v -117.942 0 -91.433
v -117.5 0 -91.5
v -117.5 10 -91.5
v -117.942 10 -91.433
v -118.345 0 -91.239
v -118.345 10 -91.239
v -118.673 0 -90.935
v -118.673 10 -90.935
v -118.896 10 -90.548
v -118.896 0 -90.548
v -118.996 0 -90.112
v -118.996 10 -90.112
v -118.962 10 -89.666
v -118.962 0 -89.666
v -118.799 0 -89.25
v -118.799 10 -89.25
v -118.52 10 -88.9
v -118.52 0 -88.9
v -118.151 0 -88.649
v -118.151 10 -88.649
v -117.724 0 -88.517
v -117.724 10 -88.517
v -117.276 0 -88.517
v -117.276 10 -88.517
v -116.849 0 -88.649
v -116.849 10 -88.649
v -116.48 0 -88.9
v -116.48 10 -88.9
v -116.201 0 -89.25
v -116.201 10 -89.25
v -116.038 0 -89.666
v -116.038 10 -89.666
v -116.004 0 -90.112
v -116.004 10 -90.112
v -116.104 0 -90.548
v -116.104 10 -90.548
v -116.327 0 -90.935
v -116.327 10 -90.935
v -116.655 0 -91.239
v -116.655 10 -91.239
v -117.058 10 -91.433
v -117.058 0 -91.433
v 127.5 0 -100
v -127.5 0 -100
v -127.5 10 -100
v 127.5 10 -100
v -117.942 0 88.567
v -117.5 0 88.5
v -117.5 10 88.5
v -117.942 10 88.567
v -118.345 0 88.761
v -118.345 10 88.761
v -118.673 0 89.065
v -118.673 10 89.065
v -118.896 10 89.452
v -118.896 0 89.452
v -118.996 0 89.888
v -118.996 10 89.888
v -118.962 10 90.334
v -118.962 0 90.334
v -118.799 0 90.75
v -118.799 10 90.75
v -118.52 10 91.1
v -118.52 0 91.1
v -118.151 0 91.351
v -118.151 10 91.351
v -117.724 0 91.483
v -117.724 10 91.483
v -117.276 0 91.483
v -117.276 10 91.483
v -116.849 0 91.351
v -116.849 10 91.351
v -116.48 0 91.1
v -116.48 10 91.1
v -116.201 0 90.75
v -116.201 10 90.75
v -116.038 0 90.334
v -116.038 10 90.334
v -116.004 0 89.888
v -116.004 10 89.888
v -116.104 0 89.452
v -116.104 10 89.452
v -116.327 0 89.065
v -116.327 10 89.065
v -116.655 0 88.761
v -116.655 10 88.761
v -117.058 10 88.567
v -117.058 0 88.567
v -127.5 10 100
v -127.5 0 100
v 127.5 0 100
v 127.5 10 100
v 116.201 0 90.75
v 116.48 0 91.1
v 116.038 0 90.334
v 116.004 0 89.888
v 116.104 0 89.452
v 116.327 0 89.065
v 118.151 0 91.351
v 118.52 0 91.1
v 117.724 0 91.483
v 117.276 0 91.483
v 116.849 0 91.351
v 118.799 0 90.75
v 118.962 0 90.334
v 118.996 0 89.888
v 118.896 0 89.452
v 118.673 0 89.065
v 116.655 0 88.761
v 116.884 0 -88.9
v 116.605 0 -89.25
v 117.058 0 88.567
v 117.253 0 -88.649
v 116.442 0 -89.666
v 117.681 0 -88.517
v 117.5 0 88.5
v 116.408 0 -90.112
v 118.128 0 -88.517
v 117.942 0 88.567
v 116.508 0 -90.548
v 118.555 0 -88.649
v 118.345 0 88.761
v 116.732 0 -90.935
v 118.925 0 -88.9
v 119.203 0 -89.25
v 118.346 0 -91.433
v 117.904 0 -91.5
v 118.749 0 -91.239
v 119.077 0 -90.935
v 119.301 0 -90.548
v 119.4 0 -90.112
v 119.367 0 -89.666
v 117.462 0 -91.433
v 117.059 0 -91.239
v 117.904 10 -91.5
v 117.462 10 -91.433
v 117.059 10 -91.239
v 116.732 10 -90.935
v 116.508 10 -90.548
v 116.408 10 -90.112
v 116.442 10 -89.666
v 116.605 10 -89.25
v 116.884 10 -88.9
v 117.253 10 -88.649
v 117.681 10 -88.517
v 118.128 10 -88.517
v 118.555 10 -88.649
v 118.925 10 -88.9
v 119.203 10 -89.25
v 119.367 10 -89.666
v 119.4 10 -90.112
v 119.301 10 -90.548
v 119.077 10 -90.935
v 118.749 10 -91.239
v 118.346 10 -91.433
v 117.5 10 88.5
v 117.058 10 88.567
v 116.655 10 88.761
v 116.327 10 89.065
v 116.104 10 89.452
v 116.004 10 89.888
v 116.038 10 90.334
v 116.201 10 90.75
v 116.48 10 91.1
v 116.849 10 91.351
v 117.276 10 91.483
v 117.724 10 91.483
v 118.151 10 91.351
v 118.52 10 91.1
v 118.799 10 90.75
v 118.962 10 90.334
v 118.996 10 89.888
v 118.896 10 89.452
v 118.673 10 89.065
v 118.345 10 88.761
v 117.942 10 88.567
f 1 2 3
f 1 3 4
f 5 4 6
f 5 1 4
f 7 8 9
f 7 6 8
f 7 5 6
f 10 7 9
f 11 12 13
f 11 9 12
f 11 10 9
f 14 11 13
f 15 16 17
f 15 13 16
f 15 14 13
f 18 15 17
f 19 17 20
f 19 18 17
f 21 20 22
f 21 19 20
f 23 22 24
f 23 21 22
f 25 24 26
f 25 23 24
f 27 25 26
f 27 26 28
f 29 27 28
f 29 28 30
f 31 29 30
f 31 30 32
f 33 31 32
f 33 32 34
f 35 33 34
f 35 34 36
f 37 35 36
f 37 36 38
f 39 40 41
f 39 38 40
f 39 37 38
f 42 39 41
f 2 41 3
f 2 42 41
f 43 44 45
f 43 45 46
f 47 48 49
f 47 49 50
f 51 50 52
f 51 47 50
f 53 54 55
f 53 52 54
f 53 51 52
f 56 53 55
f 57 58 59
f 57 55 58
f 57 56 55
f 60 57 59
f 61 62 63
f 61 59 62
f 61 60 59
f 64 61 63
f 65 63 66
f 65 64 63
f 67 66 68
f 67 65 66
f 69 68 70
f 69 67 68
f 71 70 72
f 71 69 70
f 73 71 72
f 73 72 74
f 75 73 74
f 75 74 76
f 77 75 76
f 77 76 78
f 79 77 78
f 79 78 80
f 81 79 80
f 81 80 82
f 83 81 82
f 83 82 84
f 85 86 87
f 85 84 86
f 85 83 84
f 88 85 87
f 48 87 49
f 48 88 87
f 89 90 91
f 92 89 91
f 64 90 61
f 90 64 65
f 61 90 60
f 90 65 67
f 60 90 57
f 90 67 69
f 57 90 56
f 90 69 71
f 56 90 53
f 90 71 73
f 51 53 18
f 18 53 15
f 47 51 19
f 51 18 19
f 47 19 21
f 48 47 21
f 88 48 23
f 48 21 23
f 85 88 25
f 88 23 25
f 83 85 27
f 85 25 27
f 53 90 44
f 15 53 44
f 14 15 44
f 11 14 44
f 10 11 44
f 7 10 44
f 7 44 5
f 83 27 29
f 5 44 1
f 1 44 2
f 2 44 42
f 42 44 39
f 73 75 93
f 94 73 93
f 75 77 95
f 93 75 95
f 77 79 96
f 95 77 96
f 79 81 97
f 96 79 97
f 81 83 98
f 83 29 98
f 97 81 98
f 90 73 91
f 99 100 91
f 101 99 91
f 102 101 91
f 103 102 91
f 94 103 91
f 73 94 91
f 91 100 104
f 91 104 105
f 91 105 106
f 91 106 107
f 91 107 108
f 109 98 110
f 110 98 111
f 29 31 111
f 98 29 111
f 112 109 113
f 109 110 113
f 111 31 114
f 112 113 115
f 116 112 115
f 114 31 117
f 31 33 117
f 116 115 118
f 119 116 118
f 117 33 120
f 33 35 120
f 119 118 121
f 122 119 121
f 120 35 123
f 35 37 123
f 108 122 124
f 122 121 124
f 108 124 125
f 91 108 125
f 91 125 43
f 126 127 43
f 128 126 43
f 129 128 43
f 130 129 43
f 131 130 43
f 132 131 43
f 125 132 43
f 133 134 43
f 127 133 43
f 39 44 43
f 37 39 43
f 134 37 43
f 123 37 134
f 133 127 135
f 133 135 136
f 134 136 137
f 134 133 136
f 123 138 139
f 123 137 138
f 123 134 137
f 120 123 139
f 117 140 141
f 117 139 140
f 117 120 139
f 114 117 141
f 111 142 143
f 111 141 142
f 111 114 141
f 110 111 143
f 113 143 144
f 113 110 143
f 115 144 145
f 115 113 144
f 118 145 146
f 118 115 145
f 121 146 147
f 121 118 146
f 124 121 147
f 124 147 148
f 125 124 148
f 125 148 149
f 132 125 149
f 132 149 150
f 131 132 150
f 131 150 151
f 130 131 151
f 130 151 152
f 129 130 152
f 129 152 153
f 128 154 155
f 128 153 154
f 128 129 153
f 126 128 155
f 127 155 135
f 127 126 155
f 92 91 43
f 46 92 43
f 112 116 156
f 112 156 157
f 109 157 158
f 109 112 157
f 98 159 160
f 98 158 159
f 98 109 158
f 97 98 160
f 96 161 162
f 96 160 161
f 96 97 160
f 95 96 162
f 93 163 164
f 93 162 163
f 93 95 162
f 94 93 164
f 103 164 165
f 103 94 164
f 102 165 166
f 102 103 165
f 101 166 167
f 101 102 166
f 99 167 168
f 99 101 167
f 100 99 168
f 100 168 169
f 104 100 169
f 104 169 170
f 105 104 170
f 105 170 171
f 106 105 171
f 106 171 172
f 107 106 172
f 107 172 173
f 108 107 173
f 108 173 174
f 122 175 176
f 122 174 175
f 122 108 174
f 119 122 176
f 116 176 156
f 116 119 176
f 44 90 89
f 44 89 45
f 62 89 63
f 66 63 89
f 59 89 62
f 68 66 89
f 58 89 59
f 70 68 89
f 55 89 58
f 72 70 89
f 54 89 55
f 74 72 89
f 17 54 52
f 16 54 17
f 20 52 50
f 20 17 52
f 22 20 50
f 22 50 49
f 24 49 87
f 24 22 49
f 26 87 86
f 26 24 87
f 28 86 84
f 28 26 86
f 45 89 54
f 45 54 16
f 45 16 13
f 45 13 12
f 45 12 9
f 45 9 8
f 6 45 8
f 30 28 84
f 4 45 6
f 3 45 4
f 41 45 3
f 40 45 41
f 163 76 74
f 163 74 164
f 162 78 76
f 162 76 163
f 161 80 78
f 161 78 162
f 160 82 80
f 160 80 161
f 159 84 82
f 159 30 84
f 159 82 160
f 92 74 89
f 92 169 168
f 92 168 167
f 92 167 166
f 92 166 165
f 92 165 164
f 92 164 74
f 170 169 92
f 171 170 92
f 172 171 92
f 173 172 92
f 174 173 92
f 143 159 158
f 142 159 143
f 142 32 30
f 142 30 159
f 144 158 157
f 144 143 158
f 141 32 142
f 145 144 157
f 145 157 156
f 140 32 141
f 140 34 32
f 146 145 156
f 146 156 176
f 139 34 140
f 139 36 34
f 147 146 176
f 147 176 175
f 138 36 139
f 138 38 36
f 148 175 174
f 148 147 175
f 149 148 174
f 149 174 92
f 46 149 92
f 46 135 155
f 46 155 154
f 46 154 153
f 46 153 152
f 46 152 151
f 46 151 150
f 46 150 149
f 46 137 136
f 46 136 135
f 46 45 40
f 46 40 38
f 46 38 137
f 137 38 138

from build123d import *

# Parameters (mm, degrees)
ESBO_O1_W                = 255
ESBO_O1_H                = 200
RESSALTO_EXTRUS_O1_DEPTH = 10
CUT_EXTRUDE2_DEPTH       = 26
CUT_EXTRUDE2_DEPTH_BACK  = 10
SKETCH1_R                = 1.5


with BuildPart() as part:
    # Esboço1 → Ressalto-extrusão1 (new body)
    with BuildSketch(Plane(origin=(0, 0, 0), x_dir=(1, 0, 0), z_dir=(0, 1, 0))):
        Rectangle(ESBO_O1_W, ESBO_O1_H)
    extrude(amount=RESSALTO_EXTRUS_O1_DEPTH)

    # Sketch1 → Cut-Extrude2 (cut, two sides: drawn at the far end of the back side and taken through both)
    with BuildSketch(Plane(origin=(0, 0, 0), x_dir=(1, 0, 0), z_dir=(0, 1, 0)).offset(-CUT_EXTRUDE2_DEPTH_BACK)):
        with Locations(Location((-117.5, 90, 0), (0, 0, 90))):
            Circle(SKETCH1_R)
        with Locations(Location((117.904272166, 90, 0), (0, 0, 90))):
            Circle(SKETCH1_R)
        with Locations(Location((117.5, -90, 0), (0, 0, 90))):
            Circle(SKETCH1_R)
        with Locations(Location((-117.5, -90, 0), (0, 0, 90))):
            Circle(SKETCH1_R)
    extrude(amount=CUT_EXTRUDE2_DEPTH + CUT_EXTRUDE2_DEPTH_BACK, mode=Mode.SUBTRACT)


solid = part.part
